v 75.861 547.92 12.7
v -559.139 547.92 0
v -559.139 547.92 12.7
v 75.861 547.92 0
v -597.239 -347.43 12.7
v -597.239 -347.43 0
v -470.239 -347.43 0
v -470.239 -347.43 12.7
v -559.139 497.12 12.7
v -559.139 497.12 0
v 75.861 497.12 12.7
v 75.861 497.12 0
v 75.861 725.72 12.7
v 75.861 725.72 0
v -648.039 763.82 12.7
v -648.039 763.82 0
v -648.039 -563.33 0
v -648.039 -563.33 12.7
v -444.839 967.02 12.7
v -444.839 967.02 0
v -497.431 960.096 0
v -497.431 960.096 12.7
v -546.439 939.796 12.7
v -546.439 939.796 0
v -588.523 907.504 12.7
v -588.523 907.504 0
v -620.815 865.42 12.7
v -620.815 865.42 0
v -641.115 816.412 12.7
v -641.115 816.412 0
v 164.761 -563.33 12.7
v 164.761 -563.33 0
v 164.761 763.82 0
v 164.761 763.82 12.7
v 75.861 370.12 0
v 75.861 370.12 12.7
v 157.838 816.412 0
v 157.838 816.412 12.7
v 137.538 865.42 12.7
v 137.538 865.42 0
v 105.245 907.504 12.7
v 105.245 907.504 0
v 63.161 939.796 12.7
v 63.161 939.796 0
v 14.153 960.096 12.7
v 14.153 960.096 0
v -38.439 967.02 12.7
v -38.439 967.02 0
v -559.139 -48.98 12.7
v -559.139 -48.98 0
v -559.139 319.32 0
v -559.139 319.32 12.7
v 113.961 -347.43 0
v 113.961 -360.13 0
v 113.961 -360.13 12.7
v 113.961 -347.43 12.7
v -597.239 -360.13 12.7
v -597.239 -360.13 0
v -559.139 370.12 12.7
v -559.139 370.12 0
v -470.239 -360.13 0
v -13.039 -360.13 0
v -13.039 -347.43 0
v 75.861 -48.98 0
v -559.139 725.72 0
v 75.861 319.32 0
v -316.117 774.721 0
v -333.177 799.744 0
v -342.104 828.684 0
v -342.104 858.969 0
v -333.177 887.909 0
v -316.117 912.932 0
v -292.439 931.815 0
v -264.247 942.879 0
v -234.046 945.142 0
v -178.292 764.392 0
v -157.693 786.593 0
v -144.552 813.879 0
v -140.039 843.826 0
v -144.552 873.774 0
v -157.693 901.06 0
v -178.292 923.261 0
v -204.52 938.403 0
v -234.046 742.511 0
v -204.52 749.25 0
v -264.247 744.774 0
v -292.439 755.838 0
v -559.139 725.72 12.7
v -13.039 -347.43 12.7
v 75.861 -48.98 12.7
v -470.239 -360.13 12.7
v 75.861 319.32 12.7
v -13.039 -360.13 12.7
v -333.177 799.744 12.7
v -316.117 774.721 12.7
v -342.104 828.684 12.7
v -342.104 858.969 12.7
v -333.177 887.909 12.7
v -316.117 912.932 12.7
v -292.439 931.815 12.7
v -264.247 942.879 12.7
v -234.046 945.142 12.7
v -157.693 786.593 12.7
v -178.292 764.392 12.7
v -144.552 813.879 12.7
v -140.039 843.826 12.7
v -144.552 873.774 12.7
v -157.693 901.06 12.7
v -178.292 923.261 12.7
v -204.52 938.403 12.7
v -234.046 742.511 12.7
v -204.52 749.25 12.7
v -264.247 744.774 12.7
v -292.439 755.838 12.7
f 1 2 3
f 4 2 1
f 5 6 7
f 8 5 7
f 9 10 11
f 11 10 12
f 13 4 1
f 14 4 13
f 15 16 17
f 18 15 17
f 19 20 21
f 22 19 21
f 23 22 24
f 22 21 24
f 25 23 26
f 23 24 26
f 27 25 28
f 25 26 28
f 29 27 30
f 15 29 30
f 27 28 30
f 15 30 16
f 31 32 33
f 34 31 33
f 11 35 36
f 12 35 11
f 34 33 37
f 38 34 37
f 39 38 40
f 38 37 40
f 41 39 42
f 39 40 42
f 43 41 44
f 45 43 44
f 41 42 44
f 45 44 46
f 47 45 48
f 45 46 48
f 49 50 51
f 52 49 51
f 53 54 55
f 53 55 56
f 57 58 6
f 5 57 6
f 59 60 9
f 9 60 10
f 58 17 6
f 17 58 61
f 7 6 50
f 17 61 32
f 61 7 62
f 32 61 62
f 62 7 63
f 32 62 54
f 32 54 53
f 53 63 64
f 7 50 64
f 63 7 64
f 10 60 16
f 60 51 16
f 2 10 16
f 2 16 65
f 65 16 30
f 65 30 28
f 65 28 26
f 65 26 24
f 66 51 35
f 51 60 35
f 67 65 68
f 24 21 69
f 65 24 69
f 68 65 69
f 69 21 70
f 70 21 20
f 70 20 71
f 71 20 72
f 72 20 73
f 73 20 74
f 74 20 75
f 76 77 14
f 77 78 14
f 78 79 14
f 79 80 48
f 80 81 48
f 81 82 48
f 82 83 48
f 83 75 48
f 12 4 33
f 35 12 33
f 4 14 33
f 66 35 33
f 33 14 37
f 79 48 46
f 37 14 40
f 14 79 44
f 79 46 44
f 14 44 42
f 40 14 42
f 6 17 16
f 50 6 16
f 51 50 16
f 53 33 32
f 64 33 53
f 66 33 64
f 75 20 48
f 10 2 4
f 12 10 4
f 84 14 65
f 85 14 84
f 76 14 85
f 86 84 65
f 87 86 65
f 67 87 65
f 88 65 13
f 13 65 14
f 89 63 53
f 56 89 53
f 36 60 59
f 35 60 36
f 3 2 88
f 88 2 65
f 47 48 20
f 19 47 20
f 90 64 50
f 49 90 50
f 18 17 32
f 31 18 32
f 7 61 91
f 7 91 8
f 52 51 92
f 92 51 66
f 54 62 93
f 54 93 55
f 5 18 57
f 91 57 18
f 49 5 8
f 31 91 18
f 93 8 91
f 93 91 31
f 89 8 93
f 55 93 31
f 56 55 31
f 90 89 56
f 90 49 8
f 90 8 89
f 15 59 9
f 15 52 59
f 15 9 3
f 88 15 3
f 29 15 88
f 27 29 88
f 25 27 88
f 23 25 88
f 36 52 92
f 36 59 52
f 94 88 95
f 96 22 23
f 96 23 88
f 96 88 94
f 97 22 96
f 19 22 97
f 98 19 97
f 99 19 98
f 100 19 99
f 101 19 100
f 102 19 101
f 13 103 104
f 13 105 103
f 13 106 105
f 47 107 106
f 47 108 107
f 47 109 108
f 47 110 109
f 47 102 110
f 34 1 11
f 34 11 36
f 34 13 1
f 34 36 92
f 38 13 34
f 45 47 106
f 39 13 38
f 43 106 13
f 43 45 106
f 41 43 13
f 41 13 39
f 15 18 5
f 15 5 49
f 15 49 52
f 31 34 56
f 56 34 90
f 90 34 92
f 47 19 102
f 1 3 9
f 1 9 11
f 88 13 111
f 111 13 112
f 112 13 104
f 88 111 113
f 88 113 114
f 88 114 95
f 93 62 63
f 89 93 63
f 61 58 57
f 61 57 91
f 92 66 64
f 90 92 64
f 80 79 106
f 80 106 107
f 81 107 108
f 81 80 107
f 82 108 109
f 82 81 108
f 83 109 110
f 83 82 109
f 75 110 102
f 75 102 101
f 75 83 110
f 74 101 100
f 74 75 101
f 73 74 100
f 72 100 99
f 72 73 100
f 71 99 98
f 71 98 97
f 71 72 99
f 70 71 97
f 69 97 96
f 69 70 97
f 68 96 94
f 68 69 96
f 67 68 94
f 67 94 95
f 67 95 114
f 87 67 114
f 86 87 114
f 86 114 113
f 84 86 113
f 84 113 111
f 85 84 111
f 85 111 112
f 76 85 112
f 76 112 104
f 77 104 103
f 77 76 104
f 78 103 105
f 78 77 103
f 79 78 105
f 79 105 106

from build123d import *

# Parameters (mm, degrees)
F0_W     = 127
F0_H     = 12.7
F0_W_2   = 635
F0_H_2   = 126.9999911487
F0_R     = 101.6
F0_H_3   = 177.8000088513
F1_DEPTH = 12.7


# Not quite as in the source:
# - a feature names something its author has since deleted; it is built from what else it names


with BuildPart() as f1:
    # F0 (on Top) → F1 (new body)
    with BuildSketch(Plane.XY):
        with BuildLine():
            ThreePointArc((-444.8386187891, 967.019580251), (-588.5227167262, 907.5036781881), (-648.0386187891, 763.819580251))
            Line((-648.0386187891, 763.819580251), (-648.0386187891, -556.980419749))
            Line((-648.0386187891, -556.980419749), (-648.0386187891, -563.330419749))
            Line((-648.0386187891, -563.330419749), (164.7613812109, -563.330419749))
            Line((164.7613812109, -563.330419749), (164.7613812109, -556.980419749))
            Line((164.7613812109, -556.980419749), (164.7613812109, 763.819580251))
            ThreePointArc((164.7613812109, 763.819580251), (105.245479148, 907.5036781881), (-38.4386187891, 967.019580251))
            Line((-38.4386187891, 967.019580251), (-444.8386187891, 967.019580251))
        make_face()
        with Locations((-533.7386187891, -353.780419749)):
            Rectangle(F0_W, F0_H, mode=Mode.SUBTRACT)
        with Locations((50.4613812109, -353.780419749)):
            Rectangle(F0_W, F0_H, mode=Mode.SUBTRACT)
        Polygon((75.8613812109, -48.980419749), (-559.1386187891, -48.980419749), (-559.1386187891, 90.719580251), (-559.1386187891, 141.519580251), (-559.1386187891, 319.319580251), (75.8613812109, 319.319580251), (75.8613812109, 141.519580251), (75.8613812109, 90.719580251), align=None, mode=Mode.SUBTRACT)
        with Locations((-241.6386187891, 433.6195758253)):
            Rectangle(F0_W_2, F0_H_2, mode=Mode.SUBTRACT)
        with Locations((-241.6386187891, 843.8264727592)):
            Circle(F0_R, mode=Mode.SUBTRACT)
        with Locations((-241.6386187891, 636.8195758253)):
            Rectangle(F0_W_2, F0_H_3, mode=Mode.SUBTRACT)
    extrude(amount=F1_DEPTH)


solid = f1.part
